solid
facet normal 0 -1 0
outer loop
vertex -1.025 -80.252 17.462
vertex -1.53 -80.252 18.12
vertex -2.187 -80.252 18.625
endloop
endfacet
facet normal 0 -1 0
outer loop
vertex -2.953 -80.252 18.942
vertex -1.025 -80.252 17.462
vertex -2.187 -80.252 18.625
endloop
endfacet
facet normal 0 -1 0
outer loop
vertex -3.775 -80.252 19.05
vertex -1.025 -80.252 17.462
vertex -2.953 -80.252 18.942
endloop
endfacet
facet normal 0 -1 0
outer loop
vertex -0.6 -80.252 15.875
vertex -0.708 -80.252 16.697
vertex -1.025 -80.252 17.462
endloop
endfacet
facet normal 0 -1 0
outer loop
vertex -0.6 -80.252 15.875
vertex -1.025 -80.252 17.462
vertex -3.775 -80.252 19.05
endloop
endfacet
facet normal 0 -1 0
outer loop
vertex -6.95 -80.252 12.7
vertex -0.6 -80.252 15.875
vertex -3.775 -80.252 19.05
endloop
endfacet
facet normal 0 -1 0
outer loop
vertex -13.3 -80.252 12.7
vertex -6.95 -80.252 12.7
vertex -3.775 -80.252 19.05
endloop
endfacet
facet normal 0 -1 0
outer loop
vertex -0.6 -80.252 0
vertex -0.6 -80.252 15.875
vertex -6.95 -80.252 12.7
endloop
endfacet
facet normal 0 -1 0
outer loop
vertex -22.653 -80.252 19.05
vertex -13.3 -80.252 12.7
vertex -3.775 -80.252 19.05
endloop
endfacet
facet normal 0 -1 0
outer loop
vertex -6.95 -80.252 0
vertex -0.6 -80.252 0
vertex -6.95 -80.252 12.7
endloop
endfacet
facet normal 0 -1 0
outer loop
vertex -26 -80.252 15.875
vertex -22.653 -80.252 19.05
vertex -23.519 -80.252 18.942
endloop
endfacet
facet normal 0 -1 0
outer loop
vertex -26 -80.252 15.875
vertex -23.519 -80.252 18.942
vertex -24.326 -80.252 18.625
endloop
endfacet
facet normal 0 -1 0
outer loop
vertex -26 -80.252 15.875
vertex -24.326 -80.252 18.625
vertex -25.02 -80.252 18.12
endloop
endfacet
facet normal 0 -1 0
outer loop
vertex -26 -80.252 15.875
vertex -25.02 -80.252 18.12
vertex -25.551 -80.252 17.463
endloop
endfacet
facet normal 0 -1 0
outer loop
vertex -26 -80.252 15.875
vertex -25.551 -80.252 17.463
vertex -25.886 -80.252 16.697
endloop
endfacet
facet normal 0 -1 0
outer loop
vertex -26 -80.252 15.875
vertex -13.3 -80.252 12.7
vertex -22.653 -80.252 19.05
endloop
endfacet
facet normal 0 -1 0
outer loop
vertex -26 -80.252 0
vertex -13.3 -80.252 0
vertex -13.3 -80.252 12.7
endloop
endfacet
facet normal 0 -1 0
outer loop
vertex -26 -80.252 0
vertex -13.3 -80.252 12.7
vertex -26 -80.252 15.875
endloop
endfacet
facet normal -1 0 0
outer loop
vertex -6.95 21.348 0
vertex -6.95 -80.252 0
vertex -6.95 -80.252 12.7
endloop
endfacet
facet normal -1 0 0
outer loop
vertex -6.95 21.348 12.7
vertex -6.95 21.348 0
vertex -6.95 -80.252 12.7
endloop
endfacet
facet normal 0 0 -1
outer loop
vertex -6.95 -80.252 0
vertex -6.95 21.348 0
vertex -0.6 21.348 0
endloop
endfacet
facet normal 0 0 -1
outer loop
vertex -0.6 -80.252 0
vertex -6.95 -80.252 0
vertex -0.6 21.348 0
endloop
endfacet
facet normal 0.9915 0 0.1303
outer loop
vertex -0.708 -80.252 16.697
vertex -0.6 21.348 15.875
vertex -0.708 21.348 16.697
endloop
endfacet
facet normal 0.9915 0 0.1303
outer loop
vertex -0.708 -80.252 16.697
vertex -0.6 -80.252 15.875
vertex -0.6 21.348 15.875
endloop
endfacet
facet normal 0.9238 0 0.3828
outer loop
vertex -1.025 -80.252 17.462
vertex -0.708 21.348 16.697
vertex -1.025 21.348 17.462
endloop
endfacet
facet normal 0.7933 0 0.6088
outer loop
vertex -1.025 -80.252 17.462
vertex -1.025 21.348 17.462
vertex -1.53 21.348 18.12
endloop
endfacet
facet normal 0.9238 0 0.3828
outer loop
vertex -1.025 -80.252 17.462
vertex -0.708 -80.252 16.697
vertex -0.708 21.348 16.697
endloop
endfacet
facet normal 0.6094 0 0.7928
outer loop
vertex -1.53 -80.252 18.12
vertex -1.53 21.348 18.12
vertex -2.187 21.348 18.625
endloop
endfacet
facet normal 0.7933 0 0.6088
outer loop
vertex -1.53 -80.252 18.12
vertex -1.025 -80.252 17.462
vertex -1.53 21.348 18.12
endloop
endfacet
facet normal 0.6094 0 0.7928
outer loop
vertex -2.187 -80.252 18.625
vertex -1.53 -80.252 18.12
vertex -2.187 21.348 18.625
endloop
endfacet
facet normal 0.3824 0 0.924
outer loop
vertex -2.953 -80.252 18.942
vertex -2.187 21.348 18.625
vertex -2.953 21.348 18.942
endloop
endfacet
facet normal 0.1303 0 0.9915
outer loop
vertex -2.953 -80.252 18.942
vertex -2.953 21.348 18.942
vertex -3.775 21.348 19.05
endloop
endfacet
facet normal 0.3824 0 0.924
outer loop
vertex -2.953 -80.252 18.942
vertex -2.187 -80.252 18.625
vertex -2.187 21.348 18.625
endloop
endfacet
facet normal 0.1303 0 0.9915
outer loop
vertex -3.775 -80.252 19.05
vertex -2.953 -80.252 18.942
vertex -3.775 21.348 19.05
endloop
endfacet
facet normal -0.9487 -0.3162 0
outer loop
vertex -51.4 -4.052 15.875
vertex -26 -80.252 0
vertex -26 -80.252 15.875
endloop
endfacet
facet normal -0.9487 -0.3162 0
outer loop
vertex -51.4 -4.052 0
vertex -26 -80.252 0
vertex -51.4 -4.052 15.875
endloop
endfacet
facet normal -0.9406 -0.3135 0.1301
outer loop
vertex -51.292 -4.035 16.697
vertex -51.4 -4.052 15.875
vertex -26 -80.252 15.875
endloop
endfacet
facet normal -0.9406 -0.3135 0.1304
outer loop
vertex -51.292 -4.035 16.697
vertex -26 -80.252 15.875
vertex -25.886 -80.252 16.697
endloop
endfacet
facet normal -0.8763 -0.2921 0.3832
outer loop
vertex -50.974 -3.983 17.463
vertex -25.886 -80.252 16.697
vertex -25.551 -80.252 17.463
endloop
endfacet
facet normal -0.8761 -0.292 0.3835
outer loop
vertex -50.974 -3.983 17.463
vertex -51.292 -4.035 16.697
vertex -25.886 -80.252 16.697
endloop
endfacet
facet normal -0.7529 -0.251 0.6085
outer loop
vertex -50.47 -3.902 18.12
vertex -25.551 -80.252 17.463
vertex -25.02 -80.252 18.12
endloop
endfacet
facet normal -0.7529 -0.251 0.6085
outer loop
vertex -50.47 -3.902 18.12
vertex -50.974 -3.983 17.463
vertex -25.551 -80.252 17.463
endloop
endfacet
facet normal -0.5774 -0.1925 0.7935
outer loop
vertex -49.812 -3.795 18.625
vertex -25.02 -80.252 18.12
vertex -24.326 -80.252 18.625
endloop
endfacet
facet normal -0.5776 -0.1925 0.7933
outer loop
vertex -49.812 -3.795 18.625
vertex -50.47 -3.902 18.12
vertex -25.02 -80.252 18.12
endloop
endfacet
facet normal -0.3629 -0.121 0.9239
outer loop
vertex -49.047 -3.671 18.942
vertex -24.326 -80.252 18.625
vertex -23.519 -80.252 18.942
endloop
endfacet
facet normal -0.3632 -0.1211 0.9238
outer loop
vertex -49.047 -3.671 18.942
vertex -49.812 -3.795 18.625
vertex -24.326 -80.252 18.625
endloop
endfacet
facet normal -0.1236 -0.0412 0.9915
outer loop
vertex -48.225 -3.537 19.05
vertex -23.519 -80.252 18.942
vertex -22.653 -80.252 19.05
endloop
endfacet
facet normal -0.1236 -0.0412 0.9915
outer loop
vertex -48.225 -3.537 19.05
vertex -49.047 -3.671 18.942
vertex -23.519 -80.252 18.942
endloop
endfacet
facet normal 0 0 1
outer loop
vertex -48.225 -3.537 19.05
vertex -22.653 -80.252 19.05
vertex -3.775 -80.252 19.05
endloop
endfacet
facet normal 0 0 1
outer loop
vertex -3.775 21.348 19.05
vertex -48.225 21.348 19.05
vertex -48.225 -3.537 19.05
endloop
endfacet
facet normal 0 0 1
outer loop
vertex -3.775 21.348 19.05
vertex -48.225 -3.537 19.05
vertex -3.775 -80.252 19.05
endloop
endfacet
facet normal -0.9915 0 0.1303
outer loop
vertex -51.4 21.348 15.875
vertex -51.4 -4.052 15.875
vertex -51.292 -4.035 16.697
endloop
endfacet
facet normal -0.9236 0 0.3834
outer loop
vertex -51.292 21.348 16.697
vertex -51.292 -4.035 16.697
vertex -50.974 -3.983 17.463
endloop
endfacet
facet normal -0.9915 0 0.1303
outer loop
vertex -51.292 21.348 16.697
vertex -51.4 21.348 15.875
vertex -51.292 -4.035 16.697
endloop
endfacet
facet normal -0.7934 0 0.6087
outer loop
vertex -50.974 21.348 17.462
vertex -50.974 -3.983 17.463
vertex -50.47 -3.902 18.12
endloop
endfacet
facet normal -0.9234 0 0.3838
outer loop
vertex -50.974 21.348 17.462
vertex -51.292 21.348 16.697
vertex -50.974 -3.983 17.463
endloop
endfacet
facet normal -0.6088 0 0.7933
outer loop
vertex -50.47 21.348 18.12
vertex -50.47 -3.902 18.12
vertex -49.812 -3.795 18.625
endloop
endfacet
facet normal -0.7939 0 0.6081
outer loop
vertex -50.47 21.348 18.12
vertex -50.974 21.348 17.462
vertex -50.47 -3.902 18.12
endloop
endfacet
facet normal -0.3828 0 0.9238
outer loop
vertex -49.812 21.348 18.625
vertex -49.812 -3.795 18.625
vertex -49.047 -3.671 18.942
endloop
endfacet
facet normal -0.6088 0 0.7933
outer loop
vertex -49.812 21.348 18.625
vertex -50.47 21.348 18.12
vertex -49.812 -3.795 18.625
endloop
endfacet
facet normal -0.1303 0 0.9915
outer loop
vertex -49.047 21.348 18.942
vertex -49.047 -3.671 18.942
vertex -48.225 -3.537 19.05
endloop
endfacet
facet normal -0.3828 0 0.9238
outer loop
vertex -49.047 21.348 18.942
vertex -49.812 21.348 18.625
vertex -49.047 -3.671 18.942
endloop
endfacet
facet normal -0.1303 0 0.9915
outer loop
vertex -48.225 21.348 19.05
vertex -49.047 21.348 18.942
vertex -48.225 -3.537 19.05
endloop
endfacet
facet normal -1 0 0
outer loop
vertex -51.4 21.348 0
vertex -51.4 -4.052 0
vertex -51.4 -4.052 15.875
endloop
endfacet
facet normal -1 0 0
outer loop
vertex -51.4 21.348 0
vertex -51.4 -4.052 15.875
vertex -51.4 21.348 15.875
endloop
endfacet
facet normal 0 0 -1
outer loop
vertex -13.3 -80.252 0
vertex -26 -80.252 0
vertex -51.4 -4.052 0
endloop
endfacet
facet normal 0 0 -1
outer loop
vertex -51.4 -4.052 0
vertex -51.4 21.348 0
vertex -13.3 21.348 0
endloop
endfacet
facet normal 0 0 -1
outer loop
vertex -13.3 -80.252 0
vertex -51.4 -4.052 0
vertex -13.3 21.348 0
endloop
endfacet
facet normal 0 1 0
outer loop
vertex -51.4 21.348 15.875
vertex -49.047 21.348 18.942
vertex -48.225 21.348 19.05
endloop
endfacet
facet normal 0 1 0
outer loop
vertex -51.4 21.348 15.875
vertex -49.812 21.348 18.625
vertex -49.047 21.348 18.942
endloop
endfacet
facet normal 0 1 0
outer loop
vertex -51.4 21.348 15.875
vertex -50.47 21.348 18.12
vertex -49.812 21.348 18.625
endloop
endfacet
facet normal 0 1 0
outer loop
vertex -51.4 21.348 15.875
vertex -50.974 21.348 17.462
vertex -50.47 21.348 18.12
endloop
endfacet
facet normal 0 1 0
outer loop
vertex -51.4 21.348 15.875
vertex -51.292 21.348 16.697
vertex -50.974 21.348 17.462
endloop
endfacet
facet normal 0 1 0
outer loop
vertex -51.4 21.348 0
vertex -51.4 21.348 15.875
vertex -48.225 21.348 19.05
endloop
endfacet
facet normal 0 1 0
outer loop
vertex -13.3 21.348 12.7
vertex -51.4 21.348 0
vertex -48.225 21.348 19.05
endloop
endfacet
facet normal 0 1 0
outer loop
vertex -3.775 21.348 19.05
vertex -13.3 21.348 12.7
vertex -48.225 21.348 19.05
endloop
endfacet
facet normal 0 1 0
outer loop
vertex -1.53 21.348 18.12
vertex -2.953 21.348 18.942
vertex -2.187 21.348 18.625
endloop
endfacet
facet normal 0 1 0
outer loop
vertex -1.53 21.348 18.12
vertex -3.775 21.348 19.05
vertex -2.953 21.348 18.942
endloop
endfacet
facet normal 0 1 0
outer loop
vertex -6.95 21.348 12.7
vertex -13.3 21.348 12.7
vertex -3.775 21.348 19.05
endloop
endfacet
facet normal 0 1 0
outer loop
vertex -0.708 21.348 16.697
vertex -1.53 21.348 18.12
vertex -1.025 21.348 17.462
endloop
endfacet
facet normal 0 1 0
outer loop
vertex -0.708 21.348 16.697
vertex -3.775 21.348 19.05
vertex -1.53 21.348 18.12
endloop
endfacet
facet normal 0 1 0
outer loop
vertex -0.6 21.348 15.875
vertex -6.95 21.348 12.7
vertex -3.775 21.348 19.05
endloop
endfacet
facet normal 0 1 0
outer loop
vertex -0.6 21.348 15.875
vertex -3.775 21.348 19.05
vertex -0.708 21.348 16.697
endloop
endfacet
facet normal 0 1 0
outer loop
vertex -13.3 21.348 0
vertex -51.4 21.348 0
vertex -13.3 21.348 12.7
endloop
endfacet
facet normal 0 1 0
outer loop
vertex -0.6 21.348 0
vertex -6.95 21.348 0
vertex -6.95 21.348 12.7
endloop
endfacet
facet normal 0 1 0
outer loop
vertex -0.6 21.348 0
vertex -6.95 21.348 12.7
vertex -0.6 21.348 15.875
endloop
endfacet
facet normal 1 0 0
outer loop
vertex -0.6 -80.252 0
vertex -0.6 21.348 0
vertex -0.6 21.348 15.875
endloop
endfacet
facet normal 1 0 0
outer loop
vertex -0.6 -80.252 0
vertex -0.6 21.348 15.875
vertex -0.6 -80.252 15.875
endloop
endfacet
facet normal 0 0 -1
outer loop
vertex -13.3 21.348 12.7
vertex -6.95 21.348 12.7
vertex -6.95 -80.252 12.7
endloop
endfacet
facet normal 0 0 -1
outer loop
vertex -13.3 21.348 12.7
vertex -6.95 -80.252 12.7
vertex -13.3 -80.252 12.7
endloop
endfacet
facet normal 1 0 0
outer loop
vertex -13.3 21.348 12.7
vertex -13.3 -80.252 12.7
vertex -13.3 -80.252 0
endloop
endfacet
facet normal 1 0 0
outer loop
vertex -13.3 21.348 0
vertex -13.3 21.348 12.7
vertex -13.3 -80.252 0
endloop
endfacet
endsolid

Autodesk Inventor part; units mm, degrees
ref_plane "YZ Plane" through (0, 0, 0) normal (1, 0, 0) x (0, 1, 0)
ref_plane "XZ Plane" through (0, 0, 0) normal (0, 1, 0) x (-1, 0, 0)
ref_plane "XY Plane" through (0, 0, 0) normal (0, 0, 1) x (1, 0, 0)
sketch "Sketch1" plane through (0, 0, 0) normal (0, 0, 1) x (1, 0, 0)
  line L0 (-51.3998, 21.3475) -> (-0.5998, 21.3475)
  line L1 (-0.5998, 21.3475) -> (-0.5998, -80.2525)
  line L2 (-0.5998, -80.2525) -> (-25.9998, -80.2525)
  line L3 (-25.9998, -80.2525) -> (-51.3998, -4.0525)
  line L4 (-51.3998, -4.0525) -> (-51.3998, 21.3475)
  dimension "d1" = 50.8
  dimension "d3" = 25.4
  dimension "d4" = 76.2
  dimension "d5" = 25.4
extrude "Extrusion1" add sketch "Sketch1" along normal blind 19.05
sketch "Sketch2" plane through (-51.3998, 21.3475, 0) normal (0, 1, 0) x (1, 0, 0)
  line L0 (0, 0) -> (50.8, 0) projected
  line L1 (38.1, 0) -> (44.45, 0)
  line L2 (44.45, 0) -> (44.45, -12.7)
  line L3 (44.45, -12.7) -> (38.1, -12.7)
  line L4 (38.1, -12.7) -> (38.1, 0)
  line L5 (50.8, 0) -> (50.8, -19.05) projected
  point P0 (51.3998, 0)
  dimension "d8" = 6.35
  dimension "d10" = 6.35
  dimension "d11" = 12.7
extrude "Extrusion2" cut sketch "Sketch2" against normal blind 101.6
fillet "Fillet1" radius 3.175 3 edges at (-0.5998, -29.4525, 19.05) (-38.6998, -42.1525, 19.05) (-51.3998, 8.6475, 19.05)
equation "\"d12\" = d5 + d4"
properties part number "Right Leg, Front part"
